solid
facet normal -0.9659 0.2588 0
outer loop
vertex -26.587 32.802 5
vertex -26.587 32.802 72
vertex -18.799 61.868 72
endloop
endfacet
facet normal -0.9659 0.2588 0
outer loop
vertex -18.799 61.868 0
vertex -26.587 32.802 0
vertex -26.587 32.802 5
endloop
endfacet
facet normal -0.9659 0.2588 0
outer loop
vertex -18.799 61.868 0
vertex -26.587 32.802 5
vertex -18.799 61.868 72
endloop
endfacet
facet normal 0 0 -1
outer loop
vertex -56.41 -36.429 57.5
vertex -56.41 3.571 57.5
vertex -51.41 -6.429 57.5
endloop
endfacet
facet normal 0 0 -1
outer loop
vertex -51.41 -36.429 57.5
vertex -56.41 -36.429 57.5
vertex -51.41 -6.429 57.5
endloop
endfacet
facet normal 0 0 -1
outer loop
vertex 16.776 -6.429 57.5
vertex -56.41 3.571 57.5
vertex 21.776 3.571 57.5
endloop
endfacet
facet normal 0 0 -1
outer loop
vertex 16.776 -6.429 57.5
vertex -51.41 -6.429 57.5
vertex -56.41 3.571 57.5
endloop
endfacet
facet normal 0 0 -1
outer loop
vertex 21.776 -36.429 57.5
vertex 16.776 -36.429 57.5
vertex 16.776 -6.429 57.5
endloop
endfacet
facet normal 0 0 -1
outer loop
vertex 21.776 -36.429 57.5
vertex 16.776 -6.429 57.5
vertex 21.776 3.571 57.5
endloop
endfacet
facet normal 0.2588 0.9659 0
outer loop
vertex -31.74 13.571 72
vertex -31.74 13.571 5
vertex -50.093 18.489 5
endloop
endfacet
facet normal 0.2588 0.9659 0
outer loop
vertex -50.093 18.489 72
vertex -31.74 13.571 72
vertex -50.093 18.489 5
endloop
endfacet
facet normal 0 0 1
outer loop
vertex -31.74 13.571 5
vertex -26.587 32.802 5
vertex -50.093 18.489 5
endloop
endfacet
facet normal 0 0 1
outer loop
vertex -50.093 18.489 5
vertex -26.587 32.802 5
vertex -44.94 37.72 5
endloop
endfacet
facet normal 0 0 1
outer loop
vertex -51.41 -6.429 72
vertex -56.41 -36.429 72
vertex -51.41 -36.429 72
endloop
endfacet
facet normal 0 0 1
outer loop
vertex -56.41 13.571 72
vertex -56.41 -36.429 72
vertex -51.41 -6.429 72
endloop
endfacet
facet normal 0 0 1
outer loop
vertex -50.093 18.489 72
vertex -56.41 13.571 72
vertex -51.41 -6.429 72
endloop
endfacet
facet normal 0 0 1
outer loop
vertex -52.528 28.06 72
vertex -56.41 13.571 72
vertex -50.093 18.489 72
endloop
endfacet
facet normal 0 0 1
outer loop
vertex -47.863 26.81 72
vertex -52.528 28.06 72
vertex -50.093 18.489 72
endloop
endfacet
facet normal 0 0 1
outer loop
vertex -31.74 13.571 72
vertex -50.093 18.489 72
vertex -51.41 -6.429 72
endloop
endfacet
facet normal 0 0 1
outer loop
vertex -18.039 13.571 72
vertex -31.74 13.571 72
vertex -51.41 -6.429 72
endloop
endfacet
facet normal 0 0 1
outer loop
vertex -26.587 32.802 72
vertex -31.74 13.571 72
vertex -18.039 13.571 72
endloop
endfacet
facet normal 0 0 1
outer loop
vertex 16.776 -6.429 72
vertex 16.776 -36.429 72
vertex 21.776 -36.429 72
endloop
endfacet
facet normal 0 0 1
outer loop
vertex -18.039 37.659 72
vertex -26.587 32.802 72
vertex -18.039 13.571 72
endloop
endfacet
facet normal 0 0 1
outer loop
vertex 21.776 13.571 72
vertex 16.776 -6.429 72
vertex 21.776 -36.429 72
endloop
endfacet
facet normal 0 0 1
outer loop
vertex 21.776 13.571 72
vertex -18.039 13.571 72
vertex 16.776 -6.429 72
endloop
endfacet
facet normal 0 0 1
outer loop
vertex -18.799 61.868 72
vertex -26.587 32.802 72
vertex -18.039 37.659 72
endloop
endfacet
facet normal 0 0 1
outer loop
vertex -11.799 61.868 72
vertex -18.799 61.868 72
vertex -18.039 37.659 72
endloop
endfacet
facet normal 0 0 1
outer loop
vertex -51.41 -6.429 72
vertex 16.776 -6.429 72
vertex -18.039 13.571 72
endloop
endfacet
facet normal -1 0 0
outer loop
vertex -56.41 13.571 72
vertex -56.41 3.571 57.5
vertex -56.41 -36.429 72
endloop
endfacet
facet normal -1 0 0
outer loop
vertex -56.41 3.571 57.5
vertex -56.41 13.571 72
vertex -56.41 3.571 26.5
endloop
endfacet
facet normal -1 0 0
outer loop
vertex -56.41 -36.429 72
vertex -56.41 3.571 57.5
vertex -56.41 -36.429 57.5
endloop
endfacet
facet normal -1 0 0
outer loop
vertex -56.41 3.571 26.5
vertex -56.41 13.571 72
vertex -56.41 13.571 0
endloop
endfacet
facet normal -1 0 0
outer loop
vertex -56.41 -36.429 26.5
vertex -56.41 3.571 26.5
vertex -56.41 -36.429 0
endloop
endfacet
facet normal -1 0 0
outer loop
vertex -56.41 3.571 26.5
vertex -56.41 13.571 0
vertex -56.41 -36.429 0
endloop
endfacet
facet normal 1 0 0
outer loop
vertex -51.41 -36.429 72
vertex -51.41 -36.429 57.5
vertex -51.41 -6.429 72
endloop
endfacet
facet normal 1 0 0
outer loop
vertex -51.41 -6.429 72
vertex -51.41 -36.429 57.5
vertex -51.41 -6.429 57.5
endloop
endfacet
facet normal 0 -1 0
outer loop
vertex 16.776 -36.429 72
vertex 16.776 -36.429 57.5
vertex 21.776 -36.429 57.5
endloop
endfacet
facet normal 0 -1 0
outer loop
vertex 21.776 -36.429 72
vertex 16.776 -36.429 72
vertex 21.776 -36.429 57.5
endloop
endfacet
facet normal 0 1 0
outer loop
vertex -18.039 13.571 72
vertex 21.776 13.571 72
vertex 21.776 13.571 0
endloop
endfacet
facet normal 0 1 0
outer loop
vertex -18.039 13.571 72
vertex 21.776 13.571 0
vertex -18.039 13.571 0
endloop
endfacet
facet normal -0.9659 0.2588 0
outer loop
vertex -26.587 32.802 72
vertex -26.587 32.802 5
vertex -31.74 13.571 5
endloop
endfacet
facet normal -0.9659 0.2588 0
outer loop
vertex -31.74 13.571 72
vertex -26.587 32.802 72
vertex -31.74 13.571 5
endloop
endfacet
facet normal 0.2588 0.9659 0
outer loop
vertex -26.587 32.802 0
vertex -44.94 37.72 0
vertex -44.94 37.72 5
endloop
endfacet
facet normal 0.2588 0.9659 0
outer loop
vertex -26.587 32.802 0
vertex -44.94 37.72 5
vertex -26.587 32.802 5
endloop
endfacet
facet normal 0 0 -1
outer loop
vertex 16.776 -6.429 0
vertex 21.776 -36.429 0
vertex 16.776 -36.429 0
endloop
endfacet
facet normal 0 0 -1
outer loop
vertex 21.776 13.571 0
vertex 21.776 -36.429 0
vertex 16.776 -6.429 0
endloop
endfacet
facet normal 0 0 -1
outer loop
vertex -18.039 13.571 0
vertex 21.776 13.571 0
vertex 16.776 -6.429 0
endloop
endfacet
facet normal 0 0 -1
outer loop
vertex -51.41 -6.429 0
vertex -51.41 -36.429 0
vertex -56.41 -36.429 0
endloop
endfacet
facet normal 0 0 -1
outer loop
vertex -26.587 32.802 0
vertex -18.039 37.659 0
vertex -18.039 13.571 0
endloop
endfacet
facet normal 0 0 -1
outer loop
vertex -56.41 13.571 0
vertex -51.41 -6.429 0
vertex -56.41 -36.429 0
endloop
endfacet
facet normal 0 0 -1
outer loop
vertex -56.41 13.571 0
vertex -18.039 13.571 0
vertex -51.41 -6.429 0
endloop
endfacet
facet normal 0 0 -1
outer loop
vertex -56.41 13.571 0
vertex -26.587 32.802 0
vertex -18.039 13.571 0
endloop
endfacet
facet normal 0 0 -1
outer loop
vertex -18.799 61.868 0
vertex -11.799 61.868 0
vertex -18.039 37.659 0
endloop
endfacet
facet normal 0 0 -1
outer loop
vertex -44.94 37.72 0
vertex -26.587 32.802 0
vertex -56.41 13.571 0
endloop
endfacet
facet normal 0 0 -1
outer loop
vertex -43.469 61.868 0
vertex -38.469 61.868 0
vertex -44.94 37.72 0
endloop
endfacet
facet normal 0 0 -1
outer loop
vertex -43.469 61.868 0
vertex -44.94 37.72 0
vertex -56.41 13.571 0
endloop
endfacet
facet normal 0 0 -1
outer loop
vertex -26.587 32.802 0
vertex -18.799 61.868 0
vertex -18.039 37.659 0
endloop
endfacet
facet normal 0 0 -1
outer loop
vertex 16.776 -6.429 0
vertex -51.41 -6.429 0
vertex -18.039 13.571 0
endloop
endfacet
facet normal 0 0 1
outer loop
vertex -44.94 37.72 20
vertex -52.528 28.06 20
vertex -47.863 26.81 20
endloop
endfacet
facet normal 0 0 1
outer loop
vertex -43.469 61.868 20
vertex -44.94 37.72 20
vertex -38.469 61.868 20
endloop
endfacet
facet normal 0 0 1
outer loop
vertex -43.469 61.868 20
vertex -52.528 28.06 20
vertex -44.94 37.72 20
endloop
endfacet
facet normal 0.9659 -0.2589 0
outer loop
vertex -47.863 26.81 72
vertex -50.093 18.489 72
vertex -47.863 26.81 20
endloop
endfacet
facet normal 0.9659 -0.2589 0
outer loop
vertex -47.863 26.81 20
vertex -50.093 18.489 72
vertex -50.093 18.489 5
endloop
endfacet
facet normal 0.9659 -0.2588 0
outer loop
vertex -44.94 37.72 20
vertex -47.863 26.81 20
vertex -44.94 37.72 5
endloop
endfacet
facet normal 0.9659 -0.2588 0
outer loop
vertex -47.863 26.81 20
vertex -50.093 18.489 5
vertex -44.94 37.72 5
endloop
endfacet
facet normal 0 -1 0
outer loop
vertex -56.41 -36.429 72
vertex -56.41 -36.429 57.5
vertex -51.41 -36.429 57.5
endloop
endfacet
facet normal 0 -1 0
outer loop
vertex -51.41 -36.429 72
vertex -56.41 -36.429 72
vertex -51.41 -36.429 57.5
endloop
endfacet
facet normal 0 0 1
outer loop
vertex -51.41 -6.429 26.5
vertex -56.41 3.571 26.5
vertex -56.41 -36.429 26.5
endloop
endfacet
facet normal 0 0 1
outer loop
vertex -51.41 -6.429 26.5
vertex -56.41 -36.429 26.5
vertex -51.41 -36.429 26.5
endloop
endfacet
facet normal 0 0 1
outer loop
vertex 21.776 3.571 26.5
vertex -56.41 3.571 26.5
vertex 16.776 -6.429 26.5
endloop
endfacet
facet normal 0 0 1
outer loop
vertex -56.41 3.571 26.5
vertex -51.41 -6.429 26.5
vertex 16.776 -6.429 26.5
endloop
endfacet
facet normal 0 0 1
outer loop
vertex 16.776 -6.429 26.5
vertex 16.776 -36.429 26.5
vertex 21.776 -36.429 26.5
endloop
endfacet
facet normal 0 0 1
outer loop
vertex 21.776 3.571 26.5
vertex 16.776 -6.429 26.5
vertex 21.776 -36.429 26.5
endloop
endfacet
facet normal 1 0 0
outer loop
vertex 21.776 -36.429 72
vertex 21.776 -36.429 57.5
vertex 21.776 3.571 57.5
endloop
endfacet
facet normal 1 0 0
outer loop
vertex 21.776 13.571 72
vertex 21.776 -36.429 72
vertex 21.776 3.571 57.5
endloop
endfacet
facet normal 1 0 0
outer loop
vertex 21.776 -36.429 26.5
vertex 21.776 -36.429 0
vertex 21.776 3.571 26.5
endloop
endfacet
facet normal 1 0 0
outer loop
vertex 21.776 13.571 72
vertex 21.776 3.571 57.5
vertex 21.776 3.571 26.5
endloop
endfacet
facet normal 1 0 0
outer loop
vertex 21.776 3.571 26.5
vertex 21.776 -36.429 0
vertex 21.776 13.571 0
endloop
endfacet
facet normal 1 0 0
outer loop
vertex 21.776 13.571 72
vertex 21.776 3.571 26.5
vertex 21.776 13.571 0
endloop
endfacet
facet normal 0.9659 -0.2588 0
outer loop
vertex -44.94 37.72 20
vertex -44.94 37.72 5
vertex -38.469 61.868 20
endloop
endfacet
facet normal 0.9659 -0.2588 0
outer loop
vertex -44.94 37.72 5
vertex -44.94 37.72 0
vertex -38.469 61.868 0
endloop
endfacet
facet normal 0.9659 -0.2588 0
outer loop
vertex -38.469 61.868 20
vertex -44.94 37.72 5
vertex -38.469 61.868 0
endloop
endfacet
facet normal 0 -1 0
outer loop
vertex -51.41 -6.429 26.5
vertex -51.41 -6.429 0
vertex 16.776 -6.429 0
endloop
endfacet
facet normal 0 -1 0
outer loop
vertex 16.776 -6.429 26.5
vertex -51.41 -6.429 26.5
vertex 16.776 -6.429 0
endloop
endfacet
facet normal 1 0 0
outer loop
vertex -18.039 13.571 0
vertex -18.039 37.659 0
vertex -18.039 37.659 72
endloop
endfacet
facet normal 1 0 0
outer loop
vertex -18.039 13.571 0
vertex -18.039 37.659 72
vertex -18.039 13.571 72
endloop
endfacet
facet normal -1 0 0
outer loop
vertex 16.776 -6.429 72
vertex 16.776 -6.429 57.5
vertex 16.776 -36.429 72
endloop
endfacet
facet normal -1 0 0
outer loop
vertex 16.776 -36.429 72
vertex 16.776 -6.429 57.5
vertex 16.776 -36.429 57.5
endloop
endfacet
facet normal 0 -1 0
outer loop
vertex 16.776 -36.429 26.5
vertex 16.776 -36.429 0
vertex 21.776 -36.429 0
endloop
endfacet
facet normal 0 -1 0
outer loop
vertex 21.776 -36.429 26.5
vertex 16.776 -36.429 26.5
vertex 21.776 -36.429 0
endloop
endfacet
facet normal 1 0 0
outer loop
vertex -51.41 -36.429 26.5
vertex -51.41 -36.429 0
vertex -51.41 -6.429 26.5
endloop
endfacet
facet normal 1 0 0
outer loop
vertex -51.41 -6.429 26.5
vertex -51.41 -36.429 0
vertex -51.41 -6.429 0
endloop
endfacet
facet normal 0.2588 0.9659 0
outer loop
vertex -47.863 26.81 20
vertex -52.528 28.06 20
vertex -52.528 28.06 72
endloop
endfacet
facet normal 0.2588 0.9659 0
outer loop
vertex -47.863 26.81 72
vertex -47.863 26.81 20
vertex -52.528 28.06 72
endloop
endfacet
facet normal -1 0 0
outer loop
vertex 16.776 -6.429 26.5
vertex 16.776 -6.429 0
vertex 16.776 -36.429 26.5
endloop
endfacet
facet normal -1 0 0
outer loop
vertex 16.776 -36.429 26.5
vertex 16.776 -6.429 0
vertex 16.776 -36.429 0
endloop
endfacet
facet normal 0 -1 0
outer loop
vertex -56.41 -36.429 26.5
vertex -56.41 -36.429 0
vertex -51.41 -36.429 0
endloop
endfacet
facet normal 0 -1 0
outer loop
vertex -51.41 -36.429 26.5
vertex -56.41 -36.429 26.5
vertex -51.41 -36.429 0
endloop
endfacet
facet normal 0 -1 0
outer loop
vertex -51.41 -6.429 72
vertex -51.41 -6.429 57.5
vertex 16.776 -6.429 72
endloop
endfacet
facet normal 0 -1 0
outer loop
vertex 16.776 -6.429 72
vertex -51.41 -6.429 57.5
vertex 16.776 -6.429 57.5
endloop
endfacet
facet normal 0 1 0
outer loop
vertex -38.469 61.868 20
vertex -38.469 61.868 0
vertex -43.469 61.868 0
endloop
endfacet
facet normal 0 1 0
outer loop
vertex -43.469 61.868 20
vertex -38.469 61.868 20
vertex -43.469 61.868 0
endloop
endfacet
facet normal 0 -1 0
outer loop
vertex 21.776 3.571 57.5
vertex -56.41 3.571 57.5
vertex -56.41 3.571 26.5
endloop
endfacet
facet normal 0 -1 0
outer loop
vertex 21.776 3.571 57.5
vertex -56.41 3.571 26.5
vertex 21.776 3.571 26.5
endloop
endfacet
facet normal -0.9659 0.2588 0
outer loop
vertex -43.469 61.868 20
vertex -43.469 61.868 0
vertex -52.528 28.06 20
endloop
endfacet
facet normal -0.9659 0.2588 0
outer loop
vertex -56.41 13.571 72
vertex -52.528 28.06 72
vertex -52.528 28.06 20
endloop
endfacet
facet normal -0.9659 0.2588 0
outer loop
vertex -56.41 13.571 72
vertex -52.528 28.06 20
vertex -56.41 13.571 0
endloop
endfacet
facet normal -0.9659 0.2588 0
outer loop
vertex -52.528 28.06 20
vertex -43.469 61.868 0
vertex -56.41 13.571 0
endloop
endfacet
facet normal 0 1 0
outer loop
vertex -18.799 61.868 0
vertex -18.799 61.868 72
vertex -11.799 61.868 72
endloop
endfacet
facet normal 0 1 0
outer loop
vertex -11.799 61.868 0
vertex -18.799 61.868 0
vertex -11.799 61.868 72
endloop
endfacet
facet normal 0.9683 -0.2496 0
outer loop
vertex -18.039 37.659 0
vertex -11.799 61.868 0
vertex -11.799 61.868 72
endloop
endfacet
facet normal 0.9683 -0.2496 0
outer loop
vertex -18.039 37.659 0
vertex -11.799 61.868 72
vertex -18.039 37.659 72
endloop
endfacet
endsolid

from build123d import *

# Parameters (mm, degrees)
EXTRUDE_1_DEPTH     = 72
SKETCH_2_W          = 68.186813186
SKETCH_2_H          = 31
CUT_EXTRUDE_1_DEPTH = 10
SKETCH_3_W          = 5
SKETCH_3_H          = 31
CUT_EXTRUDE_3_DEPTH = 40
SKETCH_4_W          = 5
SKETCH_4_H          = 31
CUT_EXTRUDE_4_DEPTH = 40
EXTRUDE_6_DEPTH     = 5
EXTRUDE_7_DEPTH     = 67
SKETCH_12_W         = 52
SKETCH_12_H         = 36.720454309
CUT_EXTRUDE_5_DEPTH = 5


with BuildPart() as part:
    # 草圖1 → 填料-伸長1 (new body)
    with BuildSketch(Plane.XY):
        Polygon((-56.41038016, 13.571428571), (-56.41038016, -36.428571429), (-51.41038016, -36.428571429), (-51.41038016, -6.428571429), (16.776433026, -6.428571429), (16.776433026, -36.428571429), (21.776433026, -36.428571429), (21.776433026, 13.571428571), align=None)
    extrude(amount=EXTRUDE_1_DEPTH)

    # 草圖2 → 除料-伸長1 (cut)
    with BuildSketch(Plane.XZ.offset(6.428571429)):
        with Locations((-17.316973567, 42)):
            Rectangle(SKETCH_2_W, SKETCH_2_H)
    extrude(amount=-CUT_EXTRUDE_1_DEPTH, mode=Mode.SUBTRACT)

    # 草圖3 → 除料-伸長3 (cut)
    with BuildSketch(Plane.XZ.offset(36.428571429)):
        with Locations((-53.91038016, 42)):
            Rectangle(SKETCH_3_W, SKETCH_3_H)
    extrude(amount=-CUT_EXTRUDE_3_DEPTH, mode=Mode.SUBTRACT)

    # 草圖4 → 除料-伸長4 (cut)
    with BuildSketch(Plane.XZ.offset(36.428571429)):
        with Locations((19.276433026, 42)):
            Rectangle(SKETCH_4_W, SKETCH_4_H)
    extrude(amount=-CUT_EXTRUDE_4_DEPTH, mode=Mode.SUBTRACT)

    # 草圖10 → 填料-伸長6 (add)
    with BuildSketch(Plane.XY):
        Polygon((-56.41038016, 13.571428571), (-43.469427905, 61.867719886), (-38.469427905, 61.867719886), (-44.939904033, 37.719574229), (-26.587313333, 32.802012372), (-18.799180477, 61.867719886), (-11.799180477, 61.867719886), (-18.038970236, 37.658939996), (-18.038970236, 13.571428571), align=None)
    extrude(amount=EXTRUDE_6_DEPTH)

    # 草圖11 → 填料-伸長7 (add)
    with BuildSketch(Plane.XY.offset(5)):
        Polygon((-43.469427905, 61.867719886), (-56.41038016, 13.571428571), (-31.740132733, 13.571428571), (-50.092723432, 18.488990428), (-44.939904033, 37.719574229), (-38.469427905, 61.867719886), align=None)
        Polygon((-26.587313333, 32.802012372), (-31.740132733, 13.571428571), (-18.038970236, 13.571428571), (-18.038970236, 37.658939996), (-11.799180477, 61.867719886), (-18.799180477, 61.867719886), align=None)
    extrude(amount=EXTRUDE_7_DEPTH)

    # 草圖12 → 除料-伸長5 (cut)
    with BuildSketch(Plane(origin=(-56.024458351, 15.011708372, 0), x_dir=(0, 0, 1), z_dir=(-0.965925826, 0.258819045, 0))):
        with Locations((46, 31.869139784)):
            Rectangle(SKETCH_12_W, SKETCH_12_H)
    extrude(amount=-CUT_EXTRUDE_5_DEPTH, mode=Mode.SUBTRACT)


solid = part.part
